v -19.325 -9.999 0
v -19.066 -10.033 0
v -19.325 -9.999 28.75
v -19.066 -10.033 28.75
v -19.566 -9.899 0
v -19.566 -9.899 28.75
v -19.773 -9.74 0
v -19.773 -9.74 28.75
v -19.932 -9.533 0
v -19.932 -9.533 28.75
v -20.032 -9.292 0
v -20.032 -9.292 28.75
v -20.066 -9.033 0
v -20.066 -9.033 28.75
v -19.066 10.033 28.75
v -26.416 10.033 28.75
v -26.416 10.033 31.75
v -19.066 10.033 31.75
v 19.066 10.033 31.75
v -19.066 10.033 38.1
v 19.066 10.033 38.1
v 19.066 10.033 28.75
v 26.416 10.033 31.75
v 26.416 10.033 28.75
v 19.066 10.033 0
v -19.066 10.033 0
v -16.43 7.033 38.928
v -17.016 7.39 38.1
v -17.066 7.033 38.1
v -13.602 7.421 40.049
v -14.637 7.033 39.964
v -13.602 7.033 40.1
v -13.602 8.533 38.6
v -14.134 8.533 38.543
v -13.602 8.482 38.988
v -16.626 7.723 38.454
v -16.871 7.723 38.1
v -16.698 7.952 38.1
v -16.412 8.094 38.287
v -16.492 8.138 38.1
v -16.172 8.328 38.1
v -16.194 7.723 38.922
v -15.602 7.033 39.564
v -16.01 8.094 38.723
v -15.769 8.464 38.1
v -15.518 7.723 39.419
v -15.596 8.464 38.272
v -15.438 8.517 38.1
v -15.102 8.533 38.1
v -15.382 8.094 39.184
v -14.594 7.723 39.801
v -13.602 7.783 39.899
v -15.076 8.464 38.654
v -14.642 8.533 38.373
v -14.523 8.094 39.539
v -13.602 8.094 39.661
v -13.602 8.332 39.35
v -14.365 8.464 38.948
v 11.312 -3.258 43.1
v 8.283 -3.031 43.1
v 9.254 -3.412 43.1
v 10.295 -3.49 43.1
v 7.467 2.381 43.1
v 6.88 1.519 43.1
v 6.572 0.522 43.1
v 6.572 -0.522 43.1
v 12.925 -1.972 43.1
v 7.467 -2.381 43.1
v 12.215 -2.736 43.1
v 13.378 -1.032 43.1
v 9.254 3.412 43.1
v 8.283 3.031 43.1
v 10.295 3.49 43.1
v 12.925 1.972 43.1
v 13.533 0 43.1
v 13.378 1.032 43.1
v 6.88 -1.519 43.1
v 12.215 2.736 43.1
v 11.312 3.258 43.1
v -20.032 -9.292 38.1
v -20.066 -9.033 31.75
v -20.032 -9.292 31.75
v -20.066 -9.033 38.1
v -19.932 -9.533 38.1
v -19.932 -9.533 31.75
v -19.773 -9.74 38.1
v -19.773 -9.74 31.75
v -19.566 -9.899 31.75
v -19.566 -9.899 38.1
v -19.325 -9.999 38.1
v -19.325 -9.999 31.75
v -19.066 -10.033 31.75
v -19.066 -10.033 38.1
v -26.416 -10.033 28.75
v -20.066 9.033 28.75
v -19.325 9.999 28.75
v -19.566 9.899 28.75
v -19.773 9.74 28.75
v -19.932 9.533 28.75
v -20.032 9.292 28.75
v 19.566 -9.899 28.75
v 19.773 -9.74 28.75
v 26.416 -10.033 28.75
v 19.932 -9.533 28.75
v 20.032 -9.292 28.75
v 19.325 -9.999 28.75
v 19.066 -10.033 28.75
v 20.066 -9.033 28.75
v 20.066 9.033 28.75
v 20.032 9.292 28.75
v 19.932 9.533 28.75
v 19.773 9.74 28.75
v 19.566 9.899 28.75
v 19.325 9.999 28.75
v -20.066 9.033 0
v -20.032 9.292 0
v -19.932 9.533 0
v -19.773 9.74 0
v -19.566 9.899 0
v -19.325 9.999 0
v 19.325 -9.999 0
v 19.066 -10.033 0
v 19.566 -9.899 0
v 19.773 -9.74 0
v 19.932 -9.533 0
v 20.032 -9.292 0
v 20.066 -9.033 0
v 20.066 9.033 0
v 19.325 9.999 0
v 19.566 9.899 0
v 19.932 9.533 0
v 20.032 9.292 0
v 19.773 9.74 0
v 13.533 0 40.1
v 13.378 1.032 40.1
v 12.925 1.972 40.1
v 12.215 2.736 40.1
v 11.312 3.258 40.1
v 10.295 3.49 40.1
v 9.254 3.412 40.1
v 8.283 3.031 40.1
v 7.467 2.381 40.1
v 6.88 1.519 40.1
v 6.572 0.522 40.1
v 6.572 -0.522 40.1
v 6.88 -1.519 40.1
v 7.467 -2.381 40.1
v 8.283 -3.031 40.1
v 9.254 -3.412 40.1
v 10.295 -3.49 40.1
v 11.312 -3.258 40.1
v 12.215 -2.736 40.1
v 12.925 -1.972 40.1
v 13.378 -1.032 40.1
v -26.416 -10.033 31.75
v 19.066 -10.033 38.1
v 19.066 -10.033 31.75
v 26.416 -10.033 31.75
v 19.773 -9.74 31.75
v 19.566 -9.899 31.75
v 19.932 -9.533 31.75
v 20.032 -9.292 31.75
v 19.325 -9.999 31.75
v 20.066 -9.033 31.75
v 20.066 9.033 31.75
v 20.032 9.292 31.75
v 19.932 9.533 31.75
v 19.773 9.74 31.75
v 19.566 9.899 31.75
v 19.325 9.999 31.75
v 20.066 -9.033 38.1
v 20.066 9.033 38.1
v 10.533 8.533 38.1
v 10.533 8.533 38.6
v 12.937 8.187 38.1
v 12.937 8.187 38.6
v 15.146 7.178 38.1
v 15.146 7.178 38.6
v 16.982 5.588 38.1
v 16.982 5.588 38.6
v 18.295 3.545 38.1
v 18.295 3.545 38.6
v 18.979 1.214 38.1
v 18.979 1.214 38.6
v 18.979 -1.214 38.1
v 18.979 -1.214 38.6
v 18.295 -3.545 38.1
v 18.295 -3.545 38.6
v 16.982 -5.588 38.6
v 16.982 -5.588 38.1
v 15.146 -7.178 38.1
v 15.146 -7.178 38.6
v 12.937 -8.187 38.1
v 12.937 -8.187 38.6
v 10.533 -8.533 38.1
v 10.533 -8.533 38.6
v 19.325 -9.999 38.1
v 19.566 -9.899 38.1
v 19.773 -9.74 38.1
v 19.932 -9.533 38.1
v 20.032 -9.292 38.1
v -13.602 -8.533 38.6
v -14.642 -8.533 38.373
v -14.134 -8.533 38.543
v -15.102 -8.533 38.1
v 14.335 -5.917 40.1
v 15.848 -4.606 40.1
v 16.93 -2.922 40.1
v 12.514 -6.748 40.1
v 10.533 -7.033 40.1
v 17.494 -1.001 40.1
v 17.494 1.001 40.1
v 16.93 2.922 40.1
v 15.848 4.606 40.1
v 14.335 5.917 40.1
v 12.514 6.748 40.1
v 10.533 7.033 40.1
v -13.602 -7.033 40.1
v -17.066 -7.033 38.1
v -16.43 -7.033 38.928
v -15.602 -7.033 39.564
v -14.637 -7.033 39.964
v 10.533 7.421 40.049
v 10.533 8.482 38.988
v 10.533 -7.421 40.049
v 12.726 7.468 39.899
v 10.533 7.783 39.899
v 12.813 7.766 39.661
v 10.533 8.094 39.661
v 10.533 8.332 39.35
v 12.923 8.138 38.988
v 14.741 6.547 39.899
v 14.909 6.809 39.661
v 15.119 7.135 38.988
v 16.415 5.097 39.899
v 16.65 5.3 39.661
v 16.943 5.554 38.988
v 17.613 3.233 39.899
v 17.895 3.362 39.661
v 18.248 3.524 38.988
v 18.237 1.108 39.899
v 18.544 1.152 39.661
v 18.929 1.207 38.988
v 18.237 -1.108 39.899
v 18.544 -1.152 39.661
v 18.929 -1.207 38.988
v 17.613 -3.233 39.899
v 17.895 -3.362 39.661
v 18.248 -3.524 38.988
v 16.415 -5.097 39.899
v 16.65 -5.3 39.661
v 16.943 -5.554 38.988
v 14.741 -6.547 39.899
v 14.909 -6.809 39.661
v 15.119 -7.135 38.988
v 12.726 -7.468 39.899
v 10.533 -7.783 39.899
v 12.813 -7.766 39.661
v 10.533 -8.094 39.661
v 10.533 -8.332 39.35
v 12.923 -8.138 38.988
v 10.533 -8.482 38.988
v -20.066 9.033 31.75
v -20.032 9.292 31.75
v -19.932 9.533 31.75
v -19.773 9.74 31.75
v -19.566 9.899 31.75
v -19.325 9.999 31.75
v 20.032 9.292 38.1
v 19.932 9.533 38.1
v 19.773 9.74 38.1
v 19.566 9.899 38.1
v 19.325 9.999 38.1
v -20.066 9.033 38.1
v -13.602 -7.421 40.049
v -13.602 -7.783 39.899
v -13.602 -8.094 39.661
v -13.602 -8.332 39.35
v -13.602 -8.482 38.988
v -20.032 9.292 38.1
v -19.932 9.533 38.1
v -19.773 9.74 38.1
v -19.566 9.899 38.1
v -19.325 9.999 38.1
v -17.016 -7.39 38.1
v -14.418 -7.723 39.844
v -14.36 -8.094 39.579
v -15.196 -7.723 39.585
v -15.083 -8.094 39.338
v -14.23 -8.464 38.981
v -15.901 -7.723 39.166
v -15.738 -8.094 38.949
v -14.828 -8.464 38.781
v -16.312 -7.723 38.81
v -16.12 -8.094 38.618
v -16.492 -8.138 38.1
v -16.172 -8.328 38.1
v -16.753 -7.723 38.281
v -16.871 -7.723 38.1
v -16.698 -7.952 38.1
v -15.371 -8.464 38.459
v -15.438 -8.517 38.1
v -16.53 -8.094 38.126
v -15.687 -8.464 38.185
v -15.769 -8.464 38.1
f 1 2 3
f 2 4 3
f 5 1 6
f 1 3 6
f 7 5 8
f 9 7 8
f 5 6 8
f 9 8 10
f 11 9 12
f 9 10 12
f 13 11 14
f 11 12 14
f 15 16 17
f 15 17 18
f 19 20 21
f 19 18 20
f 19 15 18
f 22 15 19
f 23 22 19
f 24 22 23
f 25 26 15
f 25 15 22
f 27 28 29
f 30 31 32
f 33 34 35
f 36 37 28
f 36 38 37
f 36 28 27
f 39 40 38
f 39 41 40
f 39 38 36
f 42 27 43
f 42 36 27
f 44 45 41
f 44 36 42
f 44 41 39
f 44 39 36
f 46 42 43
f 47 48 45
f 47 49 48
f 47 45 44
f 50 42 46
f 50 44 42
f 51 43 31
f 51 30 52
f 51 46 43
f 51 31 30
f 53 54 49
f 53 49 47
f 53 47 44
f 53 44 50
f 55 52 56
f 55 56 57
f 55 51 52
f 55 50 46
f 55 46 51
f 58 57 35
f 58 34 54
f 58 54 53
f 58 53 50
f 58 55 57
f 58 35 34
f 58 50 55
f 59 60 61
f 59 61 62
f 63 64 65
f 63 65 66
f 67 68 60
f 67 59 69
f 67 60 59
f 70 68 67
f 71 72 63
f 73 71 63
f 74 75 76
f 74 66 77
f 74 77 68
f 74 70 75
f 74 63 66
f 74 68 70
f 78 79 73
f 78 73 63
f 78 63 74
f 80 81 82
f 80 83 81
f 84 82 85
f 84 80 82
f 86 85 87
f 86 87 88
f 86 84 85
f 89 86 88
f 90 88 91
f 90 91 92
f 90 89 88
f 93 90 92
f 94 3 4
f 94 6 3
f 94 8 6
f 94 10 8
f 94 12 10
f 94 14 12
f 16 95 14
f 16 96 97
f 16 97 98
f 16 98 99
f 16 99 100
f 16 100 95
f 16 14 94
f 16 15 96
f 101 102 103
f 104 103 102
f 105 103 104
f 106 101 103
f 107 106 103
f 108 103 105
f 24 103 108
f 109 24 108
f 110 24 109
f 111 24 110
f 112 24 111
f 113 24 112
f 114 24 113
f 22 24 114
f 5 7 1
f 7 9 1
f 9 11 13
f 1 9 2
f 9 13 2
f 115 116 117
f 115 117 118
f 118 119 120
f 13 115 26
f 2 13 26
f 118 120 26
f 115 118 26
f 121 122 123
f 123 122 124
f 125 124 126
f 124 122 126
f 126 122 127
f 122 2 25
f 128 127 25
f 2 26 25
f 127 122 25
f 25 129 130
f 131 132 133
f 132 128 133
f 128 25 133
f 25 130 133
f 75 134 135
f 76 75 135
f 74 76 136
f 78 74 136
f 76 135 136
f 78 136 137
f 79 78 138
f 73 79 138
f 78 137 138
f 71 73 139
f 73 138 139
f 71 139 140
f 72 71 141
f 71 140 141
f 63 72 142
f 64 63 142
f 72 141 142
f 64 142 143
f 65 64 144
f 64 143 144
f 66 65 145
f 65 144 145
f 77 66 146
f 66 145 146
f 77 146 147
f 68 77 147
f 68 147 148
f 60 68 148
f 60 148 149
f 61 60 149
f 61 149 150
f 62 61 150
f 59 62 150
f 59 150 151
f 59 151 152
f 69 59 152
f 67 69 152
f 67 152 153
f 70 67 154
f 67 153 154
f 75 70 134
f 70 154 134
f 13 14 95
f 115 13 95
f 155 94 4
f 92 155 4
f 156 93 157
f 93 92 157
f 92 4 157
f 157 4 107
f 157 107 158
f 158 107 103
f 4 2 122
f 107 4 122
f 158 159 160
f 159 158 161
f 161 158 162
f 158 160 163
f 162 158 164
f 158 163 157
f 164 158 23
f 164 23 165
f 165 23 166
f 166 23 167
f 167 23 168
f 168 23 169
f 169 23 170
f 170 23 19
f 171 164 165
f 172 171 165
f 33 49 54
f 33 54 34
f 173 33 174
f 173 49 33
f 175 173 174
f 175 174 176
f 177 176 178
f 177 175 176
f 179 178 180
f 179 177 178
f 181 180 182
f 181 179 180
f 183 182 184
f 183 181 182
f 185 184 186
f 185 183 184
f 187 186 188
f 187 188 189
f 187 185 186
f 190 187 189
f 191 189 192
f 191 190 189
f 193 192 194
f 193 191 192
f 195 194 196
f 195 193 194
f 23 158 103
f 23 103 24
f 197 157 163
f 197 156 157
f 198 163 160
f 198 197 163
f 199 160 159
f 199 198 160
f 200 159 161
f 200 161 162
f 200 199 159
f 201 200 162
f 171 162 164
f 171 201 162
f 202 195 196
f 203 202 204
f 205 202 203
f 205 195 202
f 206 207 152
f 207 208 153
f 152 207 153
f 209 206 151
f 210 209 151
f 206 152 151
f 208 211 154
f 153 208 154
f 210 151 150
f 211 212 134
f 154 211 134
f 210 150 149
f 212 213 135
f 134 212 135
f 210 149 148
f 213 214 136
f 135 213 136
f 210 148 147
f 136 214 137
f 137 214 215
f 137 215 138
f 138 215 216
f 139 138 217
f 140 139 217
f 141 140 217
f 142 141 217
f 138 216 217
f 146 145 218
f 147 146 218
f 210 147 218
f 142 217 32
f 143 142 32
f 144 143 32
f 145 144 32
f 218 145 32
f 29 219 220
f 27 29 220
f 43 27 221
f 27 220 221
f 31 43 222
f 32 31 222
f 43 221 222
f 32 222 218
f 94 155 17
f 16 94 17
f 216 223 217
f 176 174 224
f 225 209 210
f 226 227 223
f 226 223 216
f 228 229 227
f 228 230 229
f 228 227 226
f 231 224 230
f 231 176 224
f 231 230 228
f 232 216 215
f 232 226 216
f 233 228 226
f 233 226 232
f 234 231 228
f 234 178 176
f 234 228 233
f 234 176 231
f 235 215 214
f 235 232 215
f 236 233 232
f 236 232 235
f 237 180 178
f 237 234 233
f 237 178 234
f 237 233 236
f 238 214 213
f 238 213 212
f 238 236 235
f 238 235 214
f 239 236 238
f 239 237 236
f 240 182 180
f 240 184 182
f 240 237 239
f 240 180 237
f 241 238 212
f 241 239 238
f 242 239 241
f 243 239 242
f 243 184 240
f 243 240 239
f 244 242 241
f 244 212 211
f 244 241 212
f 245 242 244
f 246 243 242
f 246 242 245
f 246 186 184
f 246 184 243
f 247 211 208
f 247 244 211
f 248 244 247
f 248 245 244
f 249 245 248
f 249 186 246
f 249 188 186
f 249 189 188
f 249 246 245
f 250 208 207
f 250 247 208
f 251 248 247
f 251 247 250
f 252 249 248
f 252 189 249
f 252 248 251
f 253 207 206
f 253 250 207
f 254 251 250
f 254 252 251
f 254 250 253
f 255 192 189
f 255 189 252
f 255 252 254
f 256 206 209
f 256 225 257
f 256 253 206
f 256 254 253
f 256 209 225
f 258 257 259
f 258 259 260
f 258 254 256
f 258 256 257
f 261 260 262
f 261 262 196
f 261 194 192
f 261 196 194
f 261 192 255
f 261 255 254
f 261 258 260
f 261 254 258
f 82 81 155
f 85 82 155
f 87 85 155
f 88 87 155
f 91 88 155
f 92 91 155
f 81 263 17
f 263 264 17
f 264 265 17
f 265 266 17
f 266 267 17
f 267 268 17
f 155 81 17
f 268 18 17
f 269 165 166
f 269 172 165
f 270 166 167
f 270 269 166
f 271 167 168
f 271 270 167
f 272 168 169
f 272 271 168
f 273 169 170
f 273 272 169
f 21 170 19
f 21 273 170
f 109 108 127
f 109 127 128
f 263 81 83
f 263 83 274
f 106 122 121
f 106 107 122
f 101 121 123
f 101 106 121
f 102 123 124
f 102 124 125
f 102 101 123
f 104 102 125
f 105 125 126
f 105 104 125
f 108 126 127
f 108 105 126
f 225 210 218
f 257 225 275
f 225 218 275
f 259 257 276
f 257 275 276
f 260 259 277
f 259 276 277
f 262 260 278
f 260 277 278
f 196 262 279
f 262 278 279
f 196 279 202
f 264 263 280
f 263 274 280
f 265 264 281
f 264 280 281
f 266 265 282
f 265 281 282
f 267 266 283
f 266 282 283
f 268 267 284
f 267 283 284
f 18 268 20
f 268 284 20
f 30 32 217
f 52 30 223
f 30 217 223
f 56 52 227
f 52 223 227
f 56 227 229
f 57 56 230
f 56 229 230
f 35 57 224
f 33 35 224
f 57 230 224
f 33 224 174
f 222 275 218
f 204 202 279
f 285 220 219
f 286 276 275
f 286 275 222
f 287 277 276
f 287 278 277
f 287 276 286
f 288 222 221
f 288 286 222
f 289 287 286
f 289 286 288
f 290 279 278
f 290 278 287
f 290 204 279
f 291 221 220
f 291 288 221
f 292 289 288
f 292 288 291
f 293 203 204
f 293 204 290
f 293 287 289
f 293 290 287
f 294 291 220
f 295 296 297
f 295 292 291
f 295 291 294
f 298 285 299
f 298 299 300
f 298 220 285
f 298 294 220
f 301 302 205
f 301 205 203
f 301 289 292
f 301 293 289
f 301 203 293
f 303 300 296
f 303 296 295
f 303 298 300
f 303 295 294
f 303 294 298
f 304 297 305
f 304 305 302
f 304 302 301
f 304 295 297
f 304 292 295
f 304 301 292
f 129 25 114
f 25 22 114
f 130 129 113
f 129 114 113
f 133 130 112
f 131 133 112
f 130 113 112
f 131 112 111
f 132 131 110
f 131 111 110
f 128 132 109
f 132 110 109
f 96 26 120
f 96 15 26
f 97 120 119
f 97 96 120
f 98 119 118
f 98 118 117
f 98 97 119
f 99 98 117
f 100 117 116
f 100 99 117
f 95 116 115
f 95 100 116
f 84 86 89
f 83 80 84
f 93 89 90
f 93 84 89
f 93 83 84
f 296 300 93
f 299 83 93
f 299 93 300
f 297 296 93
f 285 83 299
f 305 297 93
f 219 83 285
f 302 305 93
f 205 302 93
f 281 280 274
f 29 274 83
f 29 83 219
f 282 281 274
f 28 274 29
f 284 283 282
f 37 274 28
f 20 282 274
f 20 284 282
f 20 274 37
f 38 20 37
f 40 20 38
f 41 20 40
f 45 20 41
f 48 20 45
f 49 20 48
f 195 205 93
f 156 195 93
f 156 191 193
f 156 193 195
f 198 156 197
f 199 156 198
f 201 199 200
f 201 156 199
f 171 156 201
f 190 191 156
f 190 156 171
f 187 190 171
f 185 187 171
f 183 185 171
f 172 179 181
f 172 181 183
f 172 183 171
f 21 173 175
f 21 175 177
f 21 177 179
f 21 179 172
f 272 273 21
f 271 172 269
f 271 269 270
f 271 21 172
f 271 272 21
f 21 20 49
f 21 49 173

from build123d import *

# Parameters (mm, degrees)
SKETCH1_W           = 40.132
SKETCH1_H           = 20.066
BOSS_EXTRUDE1_DEPTH = 38.1
SKETCH2_W           = 6.35
SKETCH2_H           = 20.066
BOSS_EXTRUDE2_DEPTH = 3
BOSS_EXTRUDE4_DEPTH = 2
SKETCH5_R           = 3.5
BOSS_EXTRUDE3_DEPTH = 3
FILLET2_R           = 4
FILLET3_R           = 1.5
FILLET4_R           = 1


with BuildPart() as part:
    # Sketch1 → Boss-Extrude1 (new body)
    with BuildSketch(Plane.XY):
        Rectangle(SKETCH1_W, SKETCH1_H)
    extrude(amount=BOSS_EXTRUDE1_DEPTH)

    # Sketch2 → Boss-Extrude2 (add)
    with BuildSketch(Plane(origin=(0, 0, 31.75), x_dir=(-1, 0, 0), z_dir=(0, 0, -1))):
        with Locations((23.241, 0)):
            Rectangle(SKETCH2_W, SKETCH2_H)
        with Locations((-23.241, 0)):
            Rectangle(SKETCH2_W, SKETCH2_H)
    extrude(amount=BOSS_EXTRUDE2_DEPTH)

    # Sketch6 → Boss-Extrude4 (add)
    with BuildSketch(Plane.XY.offset(38.1)):
        with BuildLine():
            Line((-17.066, 8.533), (10.533, 8.533))
            ThreePointArc((10.533, 8.533), (19.066, 0), (10.533, -8.533))
            Line((10.533, -8.533), (-17.066, -8.533))
            Line((-17.066, -8.533), (-17.066, 8.533))
        make_face()
    extrude(amount=BOSS_EXTRUDE4_DEPTH)

    # Sketch5 → Boss-Extrude3 (add)
    with BuildSketch(Plane.XY.offset(40.1)):
        with Locations((10.033, 0)):
            Circle(SKETCH5_R)
    extrude(amount=BOSS_EXTRUDE3_DEPTH)

    # Fillet2
    # the kernel refuses this fillet: 4 mm, written as the material it takes off along each edge
    with BuildSketch(Plane(origin=(-17.066, -17.193254038, 40.1), x_dir=(0, 0, -1), z_dir=(0, 1, 0))) as fillet2_piece_1:
        with BuildLine():
            CenterArc((4, -3.464101615), FILLET2_R, 120, 60)
            Line((0, -3.464101615), (-0.08, -3.464101615))
            Line((-0.08, -3.464101615), (-0.08, 0))
            Line((-0.08, 0), (0, 0.08))
            ThreePointArc((0, 0.08), (1, 0.08), (1.96, 0.069282032))
            Line((1.96, 0.069282032), (2, 0))
        make_face()
    extrude(amount=34.386508076, mode=Mode.SUBTRACT)

    # Fillet3
    fillet3_edges = [part.edges().sort_by_distance(p)[0] for p in [
        (19.066, 0, 40.1),
        (-1.534449192, 8.533, 40.1),
        (-1.534449192, -8.533, 40.1),
        (-15.601898385, -8.533, 39.564101615),
        (-15.601898385, 8.533, 39.564101615),
    ]]
    fillet(fillet3_edges, radius=FILLET3_R)

    # Fillet4
    fillet4_edges = [part.edges().sort_by_distance(p)[0] for p in [
        (-20.066, -10.033, 14.375),
        (-20.066, 10.033, 14.375),
        (20.066, 10.033, 14.375),
        (20.066, -10.033, 14.375),
        (20.066, -10.033, 34.925),
        (-20.066, -10.033, 34.925),
        (-20.066, 10.033, 34.925),
        (20.066, 10.033, 34.925),
    ]]
    fillet(fillet4_edges, radius=FILLET4_R)


solid = part.part
